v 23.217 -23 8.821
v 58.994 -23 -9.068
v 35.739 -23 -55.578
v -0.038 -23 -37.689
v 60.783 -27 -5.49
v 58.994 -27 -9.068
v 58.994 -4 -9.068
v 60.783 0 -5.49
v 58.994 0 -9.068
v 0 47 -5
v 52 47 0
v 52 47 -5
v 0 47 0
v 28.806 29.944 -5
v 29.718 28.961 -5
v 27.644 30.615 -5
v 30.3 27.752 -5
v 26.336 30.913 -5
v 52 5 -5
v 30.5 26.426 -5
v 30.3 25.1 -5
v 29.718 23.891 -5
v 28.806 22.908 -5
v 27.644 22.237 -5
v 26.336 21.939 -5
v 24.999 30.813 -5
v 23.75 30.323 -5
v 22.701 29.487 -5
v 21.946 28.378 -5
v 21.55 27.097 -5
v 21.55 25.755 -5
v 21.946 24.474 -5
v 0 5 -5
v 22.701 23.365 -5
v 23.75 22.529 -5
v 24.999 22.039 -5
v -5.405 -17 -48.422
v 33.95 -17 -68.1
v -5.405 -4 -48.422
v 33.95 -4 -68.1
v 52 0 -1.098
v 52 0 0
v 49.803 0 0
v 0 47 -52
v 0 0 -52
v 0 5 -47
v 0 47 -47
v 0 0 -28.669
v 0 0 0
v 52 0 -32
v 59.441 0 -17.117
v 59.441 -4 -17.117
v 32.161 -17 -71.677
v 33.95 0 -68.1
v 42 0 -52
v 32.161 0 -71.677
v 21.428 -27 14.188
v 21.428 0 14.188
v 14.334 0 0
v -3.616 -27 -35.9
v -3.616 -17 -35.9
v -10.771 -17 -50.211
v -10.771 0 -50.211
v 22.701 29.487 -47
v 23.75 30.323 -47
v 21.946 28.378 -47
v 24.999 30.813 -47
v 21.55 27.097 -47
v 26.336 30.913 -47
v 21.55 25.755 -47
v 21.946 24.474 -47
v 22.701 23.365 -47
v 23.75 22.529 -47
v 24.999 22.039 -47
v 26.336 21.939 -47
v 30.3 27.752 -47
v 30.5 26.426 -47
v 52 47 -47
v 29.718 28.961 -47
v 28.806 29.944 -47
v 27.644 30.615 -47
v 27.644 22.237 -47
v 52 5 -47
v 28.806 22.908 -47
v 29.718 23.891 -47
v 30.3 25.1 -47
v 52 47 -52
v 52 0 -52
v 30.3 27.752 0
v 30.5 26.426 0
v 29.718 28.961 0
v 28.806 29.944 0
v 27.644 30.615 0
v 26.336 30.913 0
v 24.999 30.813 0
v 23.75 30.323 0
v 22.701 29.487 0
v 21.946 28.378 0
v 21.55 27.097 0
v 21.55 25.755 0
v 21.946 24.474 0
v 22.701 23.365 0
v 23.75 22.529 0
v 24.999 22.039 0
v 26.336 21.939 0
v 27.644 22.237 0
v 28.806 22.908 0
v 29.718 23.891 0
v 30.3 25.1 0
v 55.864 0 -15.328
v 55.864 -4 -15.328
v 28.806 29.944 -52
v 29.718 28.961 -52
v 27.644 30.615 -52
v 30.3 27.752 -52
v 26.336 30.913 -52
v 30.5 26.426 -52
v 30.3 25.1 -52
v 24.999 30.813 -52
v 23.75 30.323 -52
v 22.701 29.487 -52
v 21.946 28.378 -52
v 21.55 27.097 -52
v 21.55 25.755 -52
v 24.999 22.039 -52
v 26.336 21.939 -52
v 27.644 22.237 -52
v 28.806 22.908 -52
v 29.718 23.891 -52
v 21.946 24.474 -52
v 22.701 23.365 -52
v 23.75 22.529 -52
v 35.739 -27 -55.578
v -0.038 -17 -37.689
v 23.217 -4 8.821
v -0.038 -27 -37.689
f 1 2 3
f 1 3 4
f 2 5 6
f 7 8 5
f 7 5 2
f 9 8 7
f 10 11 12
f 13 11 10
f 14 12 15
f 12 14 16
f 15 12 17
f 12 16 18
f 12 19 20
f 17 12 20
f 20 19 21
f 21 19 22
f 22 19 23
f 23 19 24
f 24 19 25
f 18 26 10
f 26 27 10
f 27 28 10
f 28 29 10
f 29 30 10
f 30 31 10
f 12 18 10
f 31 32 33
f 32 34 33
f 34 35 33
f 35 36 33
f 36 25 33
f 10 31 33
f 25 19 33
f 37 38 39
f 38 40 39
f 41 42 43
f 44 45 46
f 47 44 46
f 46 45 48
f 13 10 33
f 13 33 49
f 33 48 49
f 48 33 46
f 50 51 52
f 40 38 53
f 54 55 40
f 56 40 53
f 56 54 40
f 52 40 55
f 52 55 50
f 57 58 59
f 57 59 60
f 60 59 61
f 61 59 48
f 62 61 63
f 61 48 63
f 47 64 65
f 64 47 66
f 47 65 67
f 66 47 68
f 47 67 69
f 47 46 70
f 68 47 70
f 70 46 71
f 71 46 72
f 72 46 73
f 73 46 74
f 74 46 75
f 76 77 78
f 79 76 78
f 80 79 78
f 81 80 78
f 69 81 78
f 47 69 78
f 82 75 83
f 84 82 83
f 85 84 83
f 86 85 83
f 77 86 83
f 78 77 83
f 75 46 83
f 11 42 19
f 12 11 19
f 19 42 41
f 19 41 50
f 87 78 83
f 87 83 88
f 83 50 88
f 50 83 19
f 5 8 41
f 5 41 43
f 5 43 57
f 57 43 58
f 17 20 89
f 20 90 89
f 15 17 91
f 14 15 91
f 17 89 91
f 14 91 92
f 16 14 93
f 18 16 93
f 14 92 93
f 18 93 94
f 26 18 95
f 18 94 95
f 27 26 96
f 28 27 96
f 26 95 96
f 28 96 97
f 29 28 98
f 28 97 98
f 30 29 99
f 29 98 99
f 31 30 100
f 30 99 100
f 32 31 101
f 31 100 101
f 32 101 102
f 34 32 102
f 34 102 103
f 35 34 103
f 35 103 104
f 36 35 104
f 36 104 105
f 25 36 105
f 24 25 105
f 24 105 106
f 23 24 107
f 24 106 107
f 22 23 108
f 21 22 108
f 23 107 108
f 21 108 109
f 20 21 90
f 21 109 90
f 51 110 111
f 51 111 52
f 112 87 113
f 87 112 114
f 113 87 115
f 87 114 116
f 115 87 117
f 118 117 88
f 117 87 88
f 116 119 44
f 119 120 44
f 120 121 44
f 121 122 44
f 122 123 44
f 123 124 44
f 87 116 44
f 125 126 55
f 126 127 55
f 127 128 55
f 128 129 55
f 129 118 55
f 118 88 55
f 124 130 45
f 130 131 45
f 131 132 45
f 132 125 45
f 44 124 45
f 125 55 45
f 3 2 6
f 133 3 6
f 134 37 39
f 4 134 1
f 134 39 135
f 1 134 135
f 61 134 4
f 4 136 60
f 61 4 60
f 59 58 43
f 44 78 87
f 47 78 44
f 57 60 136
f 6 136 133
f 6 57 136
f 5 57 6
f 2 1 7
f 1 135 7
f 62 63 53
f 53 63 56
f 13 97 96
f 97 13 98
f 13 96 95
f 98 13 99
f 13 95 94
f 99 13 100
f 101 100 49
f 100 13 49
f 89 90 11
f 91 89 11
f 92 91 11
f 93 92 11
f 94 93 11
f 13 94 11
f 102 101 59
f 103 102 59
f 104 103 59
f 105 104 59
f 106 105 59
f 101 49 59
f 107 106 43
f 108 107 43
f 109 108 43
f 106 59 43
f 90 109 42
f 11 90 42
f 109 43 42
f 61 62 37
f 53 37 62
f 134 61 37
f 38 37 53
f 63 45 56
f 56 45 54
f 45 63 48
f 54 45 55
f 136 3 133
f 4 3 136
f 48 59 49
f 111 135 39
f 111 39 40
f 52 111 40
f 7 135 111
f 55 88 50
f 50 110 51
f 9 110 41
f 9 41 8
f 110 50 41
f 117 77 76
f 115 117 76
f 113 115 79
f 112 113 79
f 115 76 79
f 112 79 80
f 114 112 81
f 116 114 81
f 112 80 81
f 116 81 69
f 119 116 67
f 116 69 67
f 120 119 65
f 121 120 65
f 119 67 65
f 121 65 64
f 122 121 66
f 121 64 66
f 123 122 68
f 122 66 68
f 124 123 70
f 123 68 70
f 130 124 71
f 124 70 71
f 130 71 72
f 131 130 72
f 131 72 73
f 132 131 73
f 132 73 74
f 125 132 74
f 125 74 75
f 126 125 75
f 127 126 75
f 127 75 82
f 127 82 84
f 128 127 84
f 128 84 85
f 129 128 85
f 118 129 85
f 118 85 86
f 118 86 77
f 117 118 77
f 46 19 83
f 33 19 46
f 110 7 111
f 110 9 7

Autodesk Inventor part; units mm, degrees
ref_plane "YZ Plane" through (0, 0, 0) normal (1, 0, 0) x (0, 1, 0)
ref_plane "XZ Plane" through (0, 0, 0) normal (0, 1, 0) x (-1, 0, 0)
ref_plane "XY Plane" through (0, 0, 0) normal (0, 0, 1) x (1, 0, 0)
sketch "스케치1" plane through (0, 0, 0) normal (0, 1, 0) x (-1, 0, 0)
  line L0 (0, 0) -> (-52, 0)
  line L1 (-52, 0) -> (-52, -52)
  line L2 (-52, -52) -> (0, -52)
  line L3 (0, -52) -> (0, 0)
  line L4 (-52, -5) -> (0, -5)
  line L5 (0, -47) -> (-52, -47)
  dimension "d0" = 52
  dimension "d1" = 52
  dimension "d2" = 5
  dimension "d7" = 5
extrude "돌출1" add sketch "스케치1" along normal blind 5 contours L3 L5 L1 L4
extrude "돌출2" add sketch "스케치1" along normal blind 47 contours L3 L4 L1 L0 | L3 L2 L1 L5
sketch "스케치2" plane through (0, 0, 0) normal (0, -1, 0) x (1, 0, 0)
  line L0 (52, -52) -> (0, -52) projected
  line L1 (52, -52) -> (52, -32)
  line L2 (52, 0) -> (52, -52) projected
  line L3 (52, -52) -> (42, -52)
  line L4 (42, -52) -> (52, -32)
  line L5 (42, -52) -> (32.1613, -71.6774)
  line L6 (32.1613, -71.6774) -> (64.3607, -7.2786)
  line L7 (64.3607, -7.2786) -> (21.4282, 14.1876)
  line L8 (21.4282, 14.1876) -> (-10.7712, -50.2111)
  line L9 (-10.7712, -50.2111) -> (32.1613, -71.6774)
  line L10 (-5.4046, -48.4223) -> (23.217, 8.821)
  line L11 (23.217, 8.821) -> (58.9941, -9.0675)
  line L12 (58.9941, -9.0675) -> (30.3724, -66.3108)
  line L13 (33.9502, -68.0997) -> (-5.4046, -48.4223)
  line L14 (60.783, -5.4898) -> (55.8636, -15.3285)
  line L15 (55.8636, -15.3285) -> (59.4413, -17.1173)
  point P0 (0, 0)
  dimension "d0" = 52
  dimension "d1" = 52
  dimension "d2" = 5
  dimension "d7" = 5
  dimension "d8" = 20
  dimension "d9" = 10
  dimension "d10" = 22
  dimension "d11" = 72
  dimension "d12" = 48
  dimension "d13" = 4
  dimension "d14" = 11
extrude "돌출3" add sketch "스케치2" along normal blind 4 contours L5 L13 L12 L0 | L0 L12 L2 L4 | L2 L12 L15 L6 | L12 L13 L0 | L0 L13 L10 L11 L2 L12 | L2 L11 L12
extrude "돌출4" add sketch "스케치2" along normal blind 27 contours L5 L9 L8 L7 L2 L11 L10 L13 | L2 L7 L14 L11
sketch "스케치3" plane through (58.9941, -27, -9.0675) normal (-0.4472136, 0, -0.8944272) x (-0.8944272, 0, 0.4472136)
  line L0 (0, 23) -> (0, 0) projected
  line L1 (0, 0) -> (0, 4)
  line L2 (0, 4) -> (40, 4)
  line L3 (40, 23) -> (40, 0) projected
  line L4 (40, 0) -> (0, 0) projected
  point P0 (56.821, 27)
  dimension "d19" = 4
extrude "돌출5" add sketch "스케치3" along normal blind 52
sketch "스케치4" plane through (0, -27, 0) normal (0, -1, 0) x (1, 0, 0)
  line L0 (32.1613, -71.6774) -> (33.9502, -68.0997) projected
  line L1 (33.9502, -68.0997) -> (-5.4046, -48.4223) projected
  line L2 (-5.4046, -48.4223) -> (-0.0381, -37.6892) projected
  line L3 (35.739, -55.5777) -> (-0.0381, -37.6892) projected
  line L4 (60.783, -5.4898) -> (35.739, -55.5777) projected
  line L5 (60.783, -5.4898) -> (21.4282, 14.1876) projected
  line L6 (21.4282, 14.1876) -> (-10.7712, -50.2111) projected
  line L7 (-10.7712, -50.2111) -> (32.1613, -71.6774) projected
  line L8 (-0.0381, -37.6892) -> (-3.6158, -35.9003)
  line L9 (32.1613, -71.6774) -> (42, -52) projected
  line L10 (33.9502, -68.0997) -> (32.1613, -71.6774)
  line L11 (32.1613, -71.6774) -> (-10.7712, -50.2111)
  line L12 (-3.6158, -35.9003) -> (-0.0381, -37.6892)
  point P0 (0, 0)
extrude "돌출6" cut sketch "스케치4" against normal blind 10 contours L7 L6 L8 L2 L1 L0
sketch "스케치5" plane through (0, 47, 0) normal (0, 0, 1) x (1, 0, 0)
  line L0 (0, -47) -> (14.3344, -47) projected
  line L1 (14.3344, -47) -> (49.8034, -47) projected
  line L2 (49.8034, -47) -> (52, -47) projected
  line L3 (52, -47) -> (52, 0) projected
  line L4 (0, 0) -> (52, 0) projected
  line L5 (0, -47) -> (0, 0) projected
  circle A0 centre (26, -20.574) radius 4.5
  point P0 (26, 0)
  dimension "d24" = 9
  dimension "d25" = 16.074
extrude "돌출7" cut sketch "스케치5" against normal blind 100 contours A0
properties part number "camera_case"
